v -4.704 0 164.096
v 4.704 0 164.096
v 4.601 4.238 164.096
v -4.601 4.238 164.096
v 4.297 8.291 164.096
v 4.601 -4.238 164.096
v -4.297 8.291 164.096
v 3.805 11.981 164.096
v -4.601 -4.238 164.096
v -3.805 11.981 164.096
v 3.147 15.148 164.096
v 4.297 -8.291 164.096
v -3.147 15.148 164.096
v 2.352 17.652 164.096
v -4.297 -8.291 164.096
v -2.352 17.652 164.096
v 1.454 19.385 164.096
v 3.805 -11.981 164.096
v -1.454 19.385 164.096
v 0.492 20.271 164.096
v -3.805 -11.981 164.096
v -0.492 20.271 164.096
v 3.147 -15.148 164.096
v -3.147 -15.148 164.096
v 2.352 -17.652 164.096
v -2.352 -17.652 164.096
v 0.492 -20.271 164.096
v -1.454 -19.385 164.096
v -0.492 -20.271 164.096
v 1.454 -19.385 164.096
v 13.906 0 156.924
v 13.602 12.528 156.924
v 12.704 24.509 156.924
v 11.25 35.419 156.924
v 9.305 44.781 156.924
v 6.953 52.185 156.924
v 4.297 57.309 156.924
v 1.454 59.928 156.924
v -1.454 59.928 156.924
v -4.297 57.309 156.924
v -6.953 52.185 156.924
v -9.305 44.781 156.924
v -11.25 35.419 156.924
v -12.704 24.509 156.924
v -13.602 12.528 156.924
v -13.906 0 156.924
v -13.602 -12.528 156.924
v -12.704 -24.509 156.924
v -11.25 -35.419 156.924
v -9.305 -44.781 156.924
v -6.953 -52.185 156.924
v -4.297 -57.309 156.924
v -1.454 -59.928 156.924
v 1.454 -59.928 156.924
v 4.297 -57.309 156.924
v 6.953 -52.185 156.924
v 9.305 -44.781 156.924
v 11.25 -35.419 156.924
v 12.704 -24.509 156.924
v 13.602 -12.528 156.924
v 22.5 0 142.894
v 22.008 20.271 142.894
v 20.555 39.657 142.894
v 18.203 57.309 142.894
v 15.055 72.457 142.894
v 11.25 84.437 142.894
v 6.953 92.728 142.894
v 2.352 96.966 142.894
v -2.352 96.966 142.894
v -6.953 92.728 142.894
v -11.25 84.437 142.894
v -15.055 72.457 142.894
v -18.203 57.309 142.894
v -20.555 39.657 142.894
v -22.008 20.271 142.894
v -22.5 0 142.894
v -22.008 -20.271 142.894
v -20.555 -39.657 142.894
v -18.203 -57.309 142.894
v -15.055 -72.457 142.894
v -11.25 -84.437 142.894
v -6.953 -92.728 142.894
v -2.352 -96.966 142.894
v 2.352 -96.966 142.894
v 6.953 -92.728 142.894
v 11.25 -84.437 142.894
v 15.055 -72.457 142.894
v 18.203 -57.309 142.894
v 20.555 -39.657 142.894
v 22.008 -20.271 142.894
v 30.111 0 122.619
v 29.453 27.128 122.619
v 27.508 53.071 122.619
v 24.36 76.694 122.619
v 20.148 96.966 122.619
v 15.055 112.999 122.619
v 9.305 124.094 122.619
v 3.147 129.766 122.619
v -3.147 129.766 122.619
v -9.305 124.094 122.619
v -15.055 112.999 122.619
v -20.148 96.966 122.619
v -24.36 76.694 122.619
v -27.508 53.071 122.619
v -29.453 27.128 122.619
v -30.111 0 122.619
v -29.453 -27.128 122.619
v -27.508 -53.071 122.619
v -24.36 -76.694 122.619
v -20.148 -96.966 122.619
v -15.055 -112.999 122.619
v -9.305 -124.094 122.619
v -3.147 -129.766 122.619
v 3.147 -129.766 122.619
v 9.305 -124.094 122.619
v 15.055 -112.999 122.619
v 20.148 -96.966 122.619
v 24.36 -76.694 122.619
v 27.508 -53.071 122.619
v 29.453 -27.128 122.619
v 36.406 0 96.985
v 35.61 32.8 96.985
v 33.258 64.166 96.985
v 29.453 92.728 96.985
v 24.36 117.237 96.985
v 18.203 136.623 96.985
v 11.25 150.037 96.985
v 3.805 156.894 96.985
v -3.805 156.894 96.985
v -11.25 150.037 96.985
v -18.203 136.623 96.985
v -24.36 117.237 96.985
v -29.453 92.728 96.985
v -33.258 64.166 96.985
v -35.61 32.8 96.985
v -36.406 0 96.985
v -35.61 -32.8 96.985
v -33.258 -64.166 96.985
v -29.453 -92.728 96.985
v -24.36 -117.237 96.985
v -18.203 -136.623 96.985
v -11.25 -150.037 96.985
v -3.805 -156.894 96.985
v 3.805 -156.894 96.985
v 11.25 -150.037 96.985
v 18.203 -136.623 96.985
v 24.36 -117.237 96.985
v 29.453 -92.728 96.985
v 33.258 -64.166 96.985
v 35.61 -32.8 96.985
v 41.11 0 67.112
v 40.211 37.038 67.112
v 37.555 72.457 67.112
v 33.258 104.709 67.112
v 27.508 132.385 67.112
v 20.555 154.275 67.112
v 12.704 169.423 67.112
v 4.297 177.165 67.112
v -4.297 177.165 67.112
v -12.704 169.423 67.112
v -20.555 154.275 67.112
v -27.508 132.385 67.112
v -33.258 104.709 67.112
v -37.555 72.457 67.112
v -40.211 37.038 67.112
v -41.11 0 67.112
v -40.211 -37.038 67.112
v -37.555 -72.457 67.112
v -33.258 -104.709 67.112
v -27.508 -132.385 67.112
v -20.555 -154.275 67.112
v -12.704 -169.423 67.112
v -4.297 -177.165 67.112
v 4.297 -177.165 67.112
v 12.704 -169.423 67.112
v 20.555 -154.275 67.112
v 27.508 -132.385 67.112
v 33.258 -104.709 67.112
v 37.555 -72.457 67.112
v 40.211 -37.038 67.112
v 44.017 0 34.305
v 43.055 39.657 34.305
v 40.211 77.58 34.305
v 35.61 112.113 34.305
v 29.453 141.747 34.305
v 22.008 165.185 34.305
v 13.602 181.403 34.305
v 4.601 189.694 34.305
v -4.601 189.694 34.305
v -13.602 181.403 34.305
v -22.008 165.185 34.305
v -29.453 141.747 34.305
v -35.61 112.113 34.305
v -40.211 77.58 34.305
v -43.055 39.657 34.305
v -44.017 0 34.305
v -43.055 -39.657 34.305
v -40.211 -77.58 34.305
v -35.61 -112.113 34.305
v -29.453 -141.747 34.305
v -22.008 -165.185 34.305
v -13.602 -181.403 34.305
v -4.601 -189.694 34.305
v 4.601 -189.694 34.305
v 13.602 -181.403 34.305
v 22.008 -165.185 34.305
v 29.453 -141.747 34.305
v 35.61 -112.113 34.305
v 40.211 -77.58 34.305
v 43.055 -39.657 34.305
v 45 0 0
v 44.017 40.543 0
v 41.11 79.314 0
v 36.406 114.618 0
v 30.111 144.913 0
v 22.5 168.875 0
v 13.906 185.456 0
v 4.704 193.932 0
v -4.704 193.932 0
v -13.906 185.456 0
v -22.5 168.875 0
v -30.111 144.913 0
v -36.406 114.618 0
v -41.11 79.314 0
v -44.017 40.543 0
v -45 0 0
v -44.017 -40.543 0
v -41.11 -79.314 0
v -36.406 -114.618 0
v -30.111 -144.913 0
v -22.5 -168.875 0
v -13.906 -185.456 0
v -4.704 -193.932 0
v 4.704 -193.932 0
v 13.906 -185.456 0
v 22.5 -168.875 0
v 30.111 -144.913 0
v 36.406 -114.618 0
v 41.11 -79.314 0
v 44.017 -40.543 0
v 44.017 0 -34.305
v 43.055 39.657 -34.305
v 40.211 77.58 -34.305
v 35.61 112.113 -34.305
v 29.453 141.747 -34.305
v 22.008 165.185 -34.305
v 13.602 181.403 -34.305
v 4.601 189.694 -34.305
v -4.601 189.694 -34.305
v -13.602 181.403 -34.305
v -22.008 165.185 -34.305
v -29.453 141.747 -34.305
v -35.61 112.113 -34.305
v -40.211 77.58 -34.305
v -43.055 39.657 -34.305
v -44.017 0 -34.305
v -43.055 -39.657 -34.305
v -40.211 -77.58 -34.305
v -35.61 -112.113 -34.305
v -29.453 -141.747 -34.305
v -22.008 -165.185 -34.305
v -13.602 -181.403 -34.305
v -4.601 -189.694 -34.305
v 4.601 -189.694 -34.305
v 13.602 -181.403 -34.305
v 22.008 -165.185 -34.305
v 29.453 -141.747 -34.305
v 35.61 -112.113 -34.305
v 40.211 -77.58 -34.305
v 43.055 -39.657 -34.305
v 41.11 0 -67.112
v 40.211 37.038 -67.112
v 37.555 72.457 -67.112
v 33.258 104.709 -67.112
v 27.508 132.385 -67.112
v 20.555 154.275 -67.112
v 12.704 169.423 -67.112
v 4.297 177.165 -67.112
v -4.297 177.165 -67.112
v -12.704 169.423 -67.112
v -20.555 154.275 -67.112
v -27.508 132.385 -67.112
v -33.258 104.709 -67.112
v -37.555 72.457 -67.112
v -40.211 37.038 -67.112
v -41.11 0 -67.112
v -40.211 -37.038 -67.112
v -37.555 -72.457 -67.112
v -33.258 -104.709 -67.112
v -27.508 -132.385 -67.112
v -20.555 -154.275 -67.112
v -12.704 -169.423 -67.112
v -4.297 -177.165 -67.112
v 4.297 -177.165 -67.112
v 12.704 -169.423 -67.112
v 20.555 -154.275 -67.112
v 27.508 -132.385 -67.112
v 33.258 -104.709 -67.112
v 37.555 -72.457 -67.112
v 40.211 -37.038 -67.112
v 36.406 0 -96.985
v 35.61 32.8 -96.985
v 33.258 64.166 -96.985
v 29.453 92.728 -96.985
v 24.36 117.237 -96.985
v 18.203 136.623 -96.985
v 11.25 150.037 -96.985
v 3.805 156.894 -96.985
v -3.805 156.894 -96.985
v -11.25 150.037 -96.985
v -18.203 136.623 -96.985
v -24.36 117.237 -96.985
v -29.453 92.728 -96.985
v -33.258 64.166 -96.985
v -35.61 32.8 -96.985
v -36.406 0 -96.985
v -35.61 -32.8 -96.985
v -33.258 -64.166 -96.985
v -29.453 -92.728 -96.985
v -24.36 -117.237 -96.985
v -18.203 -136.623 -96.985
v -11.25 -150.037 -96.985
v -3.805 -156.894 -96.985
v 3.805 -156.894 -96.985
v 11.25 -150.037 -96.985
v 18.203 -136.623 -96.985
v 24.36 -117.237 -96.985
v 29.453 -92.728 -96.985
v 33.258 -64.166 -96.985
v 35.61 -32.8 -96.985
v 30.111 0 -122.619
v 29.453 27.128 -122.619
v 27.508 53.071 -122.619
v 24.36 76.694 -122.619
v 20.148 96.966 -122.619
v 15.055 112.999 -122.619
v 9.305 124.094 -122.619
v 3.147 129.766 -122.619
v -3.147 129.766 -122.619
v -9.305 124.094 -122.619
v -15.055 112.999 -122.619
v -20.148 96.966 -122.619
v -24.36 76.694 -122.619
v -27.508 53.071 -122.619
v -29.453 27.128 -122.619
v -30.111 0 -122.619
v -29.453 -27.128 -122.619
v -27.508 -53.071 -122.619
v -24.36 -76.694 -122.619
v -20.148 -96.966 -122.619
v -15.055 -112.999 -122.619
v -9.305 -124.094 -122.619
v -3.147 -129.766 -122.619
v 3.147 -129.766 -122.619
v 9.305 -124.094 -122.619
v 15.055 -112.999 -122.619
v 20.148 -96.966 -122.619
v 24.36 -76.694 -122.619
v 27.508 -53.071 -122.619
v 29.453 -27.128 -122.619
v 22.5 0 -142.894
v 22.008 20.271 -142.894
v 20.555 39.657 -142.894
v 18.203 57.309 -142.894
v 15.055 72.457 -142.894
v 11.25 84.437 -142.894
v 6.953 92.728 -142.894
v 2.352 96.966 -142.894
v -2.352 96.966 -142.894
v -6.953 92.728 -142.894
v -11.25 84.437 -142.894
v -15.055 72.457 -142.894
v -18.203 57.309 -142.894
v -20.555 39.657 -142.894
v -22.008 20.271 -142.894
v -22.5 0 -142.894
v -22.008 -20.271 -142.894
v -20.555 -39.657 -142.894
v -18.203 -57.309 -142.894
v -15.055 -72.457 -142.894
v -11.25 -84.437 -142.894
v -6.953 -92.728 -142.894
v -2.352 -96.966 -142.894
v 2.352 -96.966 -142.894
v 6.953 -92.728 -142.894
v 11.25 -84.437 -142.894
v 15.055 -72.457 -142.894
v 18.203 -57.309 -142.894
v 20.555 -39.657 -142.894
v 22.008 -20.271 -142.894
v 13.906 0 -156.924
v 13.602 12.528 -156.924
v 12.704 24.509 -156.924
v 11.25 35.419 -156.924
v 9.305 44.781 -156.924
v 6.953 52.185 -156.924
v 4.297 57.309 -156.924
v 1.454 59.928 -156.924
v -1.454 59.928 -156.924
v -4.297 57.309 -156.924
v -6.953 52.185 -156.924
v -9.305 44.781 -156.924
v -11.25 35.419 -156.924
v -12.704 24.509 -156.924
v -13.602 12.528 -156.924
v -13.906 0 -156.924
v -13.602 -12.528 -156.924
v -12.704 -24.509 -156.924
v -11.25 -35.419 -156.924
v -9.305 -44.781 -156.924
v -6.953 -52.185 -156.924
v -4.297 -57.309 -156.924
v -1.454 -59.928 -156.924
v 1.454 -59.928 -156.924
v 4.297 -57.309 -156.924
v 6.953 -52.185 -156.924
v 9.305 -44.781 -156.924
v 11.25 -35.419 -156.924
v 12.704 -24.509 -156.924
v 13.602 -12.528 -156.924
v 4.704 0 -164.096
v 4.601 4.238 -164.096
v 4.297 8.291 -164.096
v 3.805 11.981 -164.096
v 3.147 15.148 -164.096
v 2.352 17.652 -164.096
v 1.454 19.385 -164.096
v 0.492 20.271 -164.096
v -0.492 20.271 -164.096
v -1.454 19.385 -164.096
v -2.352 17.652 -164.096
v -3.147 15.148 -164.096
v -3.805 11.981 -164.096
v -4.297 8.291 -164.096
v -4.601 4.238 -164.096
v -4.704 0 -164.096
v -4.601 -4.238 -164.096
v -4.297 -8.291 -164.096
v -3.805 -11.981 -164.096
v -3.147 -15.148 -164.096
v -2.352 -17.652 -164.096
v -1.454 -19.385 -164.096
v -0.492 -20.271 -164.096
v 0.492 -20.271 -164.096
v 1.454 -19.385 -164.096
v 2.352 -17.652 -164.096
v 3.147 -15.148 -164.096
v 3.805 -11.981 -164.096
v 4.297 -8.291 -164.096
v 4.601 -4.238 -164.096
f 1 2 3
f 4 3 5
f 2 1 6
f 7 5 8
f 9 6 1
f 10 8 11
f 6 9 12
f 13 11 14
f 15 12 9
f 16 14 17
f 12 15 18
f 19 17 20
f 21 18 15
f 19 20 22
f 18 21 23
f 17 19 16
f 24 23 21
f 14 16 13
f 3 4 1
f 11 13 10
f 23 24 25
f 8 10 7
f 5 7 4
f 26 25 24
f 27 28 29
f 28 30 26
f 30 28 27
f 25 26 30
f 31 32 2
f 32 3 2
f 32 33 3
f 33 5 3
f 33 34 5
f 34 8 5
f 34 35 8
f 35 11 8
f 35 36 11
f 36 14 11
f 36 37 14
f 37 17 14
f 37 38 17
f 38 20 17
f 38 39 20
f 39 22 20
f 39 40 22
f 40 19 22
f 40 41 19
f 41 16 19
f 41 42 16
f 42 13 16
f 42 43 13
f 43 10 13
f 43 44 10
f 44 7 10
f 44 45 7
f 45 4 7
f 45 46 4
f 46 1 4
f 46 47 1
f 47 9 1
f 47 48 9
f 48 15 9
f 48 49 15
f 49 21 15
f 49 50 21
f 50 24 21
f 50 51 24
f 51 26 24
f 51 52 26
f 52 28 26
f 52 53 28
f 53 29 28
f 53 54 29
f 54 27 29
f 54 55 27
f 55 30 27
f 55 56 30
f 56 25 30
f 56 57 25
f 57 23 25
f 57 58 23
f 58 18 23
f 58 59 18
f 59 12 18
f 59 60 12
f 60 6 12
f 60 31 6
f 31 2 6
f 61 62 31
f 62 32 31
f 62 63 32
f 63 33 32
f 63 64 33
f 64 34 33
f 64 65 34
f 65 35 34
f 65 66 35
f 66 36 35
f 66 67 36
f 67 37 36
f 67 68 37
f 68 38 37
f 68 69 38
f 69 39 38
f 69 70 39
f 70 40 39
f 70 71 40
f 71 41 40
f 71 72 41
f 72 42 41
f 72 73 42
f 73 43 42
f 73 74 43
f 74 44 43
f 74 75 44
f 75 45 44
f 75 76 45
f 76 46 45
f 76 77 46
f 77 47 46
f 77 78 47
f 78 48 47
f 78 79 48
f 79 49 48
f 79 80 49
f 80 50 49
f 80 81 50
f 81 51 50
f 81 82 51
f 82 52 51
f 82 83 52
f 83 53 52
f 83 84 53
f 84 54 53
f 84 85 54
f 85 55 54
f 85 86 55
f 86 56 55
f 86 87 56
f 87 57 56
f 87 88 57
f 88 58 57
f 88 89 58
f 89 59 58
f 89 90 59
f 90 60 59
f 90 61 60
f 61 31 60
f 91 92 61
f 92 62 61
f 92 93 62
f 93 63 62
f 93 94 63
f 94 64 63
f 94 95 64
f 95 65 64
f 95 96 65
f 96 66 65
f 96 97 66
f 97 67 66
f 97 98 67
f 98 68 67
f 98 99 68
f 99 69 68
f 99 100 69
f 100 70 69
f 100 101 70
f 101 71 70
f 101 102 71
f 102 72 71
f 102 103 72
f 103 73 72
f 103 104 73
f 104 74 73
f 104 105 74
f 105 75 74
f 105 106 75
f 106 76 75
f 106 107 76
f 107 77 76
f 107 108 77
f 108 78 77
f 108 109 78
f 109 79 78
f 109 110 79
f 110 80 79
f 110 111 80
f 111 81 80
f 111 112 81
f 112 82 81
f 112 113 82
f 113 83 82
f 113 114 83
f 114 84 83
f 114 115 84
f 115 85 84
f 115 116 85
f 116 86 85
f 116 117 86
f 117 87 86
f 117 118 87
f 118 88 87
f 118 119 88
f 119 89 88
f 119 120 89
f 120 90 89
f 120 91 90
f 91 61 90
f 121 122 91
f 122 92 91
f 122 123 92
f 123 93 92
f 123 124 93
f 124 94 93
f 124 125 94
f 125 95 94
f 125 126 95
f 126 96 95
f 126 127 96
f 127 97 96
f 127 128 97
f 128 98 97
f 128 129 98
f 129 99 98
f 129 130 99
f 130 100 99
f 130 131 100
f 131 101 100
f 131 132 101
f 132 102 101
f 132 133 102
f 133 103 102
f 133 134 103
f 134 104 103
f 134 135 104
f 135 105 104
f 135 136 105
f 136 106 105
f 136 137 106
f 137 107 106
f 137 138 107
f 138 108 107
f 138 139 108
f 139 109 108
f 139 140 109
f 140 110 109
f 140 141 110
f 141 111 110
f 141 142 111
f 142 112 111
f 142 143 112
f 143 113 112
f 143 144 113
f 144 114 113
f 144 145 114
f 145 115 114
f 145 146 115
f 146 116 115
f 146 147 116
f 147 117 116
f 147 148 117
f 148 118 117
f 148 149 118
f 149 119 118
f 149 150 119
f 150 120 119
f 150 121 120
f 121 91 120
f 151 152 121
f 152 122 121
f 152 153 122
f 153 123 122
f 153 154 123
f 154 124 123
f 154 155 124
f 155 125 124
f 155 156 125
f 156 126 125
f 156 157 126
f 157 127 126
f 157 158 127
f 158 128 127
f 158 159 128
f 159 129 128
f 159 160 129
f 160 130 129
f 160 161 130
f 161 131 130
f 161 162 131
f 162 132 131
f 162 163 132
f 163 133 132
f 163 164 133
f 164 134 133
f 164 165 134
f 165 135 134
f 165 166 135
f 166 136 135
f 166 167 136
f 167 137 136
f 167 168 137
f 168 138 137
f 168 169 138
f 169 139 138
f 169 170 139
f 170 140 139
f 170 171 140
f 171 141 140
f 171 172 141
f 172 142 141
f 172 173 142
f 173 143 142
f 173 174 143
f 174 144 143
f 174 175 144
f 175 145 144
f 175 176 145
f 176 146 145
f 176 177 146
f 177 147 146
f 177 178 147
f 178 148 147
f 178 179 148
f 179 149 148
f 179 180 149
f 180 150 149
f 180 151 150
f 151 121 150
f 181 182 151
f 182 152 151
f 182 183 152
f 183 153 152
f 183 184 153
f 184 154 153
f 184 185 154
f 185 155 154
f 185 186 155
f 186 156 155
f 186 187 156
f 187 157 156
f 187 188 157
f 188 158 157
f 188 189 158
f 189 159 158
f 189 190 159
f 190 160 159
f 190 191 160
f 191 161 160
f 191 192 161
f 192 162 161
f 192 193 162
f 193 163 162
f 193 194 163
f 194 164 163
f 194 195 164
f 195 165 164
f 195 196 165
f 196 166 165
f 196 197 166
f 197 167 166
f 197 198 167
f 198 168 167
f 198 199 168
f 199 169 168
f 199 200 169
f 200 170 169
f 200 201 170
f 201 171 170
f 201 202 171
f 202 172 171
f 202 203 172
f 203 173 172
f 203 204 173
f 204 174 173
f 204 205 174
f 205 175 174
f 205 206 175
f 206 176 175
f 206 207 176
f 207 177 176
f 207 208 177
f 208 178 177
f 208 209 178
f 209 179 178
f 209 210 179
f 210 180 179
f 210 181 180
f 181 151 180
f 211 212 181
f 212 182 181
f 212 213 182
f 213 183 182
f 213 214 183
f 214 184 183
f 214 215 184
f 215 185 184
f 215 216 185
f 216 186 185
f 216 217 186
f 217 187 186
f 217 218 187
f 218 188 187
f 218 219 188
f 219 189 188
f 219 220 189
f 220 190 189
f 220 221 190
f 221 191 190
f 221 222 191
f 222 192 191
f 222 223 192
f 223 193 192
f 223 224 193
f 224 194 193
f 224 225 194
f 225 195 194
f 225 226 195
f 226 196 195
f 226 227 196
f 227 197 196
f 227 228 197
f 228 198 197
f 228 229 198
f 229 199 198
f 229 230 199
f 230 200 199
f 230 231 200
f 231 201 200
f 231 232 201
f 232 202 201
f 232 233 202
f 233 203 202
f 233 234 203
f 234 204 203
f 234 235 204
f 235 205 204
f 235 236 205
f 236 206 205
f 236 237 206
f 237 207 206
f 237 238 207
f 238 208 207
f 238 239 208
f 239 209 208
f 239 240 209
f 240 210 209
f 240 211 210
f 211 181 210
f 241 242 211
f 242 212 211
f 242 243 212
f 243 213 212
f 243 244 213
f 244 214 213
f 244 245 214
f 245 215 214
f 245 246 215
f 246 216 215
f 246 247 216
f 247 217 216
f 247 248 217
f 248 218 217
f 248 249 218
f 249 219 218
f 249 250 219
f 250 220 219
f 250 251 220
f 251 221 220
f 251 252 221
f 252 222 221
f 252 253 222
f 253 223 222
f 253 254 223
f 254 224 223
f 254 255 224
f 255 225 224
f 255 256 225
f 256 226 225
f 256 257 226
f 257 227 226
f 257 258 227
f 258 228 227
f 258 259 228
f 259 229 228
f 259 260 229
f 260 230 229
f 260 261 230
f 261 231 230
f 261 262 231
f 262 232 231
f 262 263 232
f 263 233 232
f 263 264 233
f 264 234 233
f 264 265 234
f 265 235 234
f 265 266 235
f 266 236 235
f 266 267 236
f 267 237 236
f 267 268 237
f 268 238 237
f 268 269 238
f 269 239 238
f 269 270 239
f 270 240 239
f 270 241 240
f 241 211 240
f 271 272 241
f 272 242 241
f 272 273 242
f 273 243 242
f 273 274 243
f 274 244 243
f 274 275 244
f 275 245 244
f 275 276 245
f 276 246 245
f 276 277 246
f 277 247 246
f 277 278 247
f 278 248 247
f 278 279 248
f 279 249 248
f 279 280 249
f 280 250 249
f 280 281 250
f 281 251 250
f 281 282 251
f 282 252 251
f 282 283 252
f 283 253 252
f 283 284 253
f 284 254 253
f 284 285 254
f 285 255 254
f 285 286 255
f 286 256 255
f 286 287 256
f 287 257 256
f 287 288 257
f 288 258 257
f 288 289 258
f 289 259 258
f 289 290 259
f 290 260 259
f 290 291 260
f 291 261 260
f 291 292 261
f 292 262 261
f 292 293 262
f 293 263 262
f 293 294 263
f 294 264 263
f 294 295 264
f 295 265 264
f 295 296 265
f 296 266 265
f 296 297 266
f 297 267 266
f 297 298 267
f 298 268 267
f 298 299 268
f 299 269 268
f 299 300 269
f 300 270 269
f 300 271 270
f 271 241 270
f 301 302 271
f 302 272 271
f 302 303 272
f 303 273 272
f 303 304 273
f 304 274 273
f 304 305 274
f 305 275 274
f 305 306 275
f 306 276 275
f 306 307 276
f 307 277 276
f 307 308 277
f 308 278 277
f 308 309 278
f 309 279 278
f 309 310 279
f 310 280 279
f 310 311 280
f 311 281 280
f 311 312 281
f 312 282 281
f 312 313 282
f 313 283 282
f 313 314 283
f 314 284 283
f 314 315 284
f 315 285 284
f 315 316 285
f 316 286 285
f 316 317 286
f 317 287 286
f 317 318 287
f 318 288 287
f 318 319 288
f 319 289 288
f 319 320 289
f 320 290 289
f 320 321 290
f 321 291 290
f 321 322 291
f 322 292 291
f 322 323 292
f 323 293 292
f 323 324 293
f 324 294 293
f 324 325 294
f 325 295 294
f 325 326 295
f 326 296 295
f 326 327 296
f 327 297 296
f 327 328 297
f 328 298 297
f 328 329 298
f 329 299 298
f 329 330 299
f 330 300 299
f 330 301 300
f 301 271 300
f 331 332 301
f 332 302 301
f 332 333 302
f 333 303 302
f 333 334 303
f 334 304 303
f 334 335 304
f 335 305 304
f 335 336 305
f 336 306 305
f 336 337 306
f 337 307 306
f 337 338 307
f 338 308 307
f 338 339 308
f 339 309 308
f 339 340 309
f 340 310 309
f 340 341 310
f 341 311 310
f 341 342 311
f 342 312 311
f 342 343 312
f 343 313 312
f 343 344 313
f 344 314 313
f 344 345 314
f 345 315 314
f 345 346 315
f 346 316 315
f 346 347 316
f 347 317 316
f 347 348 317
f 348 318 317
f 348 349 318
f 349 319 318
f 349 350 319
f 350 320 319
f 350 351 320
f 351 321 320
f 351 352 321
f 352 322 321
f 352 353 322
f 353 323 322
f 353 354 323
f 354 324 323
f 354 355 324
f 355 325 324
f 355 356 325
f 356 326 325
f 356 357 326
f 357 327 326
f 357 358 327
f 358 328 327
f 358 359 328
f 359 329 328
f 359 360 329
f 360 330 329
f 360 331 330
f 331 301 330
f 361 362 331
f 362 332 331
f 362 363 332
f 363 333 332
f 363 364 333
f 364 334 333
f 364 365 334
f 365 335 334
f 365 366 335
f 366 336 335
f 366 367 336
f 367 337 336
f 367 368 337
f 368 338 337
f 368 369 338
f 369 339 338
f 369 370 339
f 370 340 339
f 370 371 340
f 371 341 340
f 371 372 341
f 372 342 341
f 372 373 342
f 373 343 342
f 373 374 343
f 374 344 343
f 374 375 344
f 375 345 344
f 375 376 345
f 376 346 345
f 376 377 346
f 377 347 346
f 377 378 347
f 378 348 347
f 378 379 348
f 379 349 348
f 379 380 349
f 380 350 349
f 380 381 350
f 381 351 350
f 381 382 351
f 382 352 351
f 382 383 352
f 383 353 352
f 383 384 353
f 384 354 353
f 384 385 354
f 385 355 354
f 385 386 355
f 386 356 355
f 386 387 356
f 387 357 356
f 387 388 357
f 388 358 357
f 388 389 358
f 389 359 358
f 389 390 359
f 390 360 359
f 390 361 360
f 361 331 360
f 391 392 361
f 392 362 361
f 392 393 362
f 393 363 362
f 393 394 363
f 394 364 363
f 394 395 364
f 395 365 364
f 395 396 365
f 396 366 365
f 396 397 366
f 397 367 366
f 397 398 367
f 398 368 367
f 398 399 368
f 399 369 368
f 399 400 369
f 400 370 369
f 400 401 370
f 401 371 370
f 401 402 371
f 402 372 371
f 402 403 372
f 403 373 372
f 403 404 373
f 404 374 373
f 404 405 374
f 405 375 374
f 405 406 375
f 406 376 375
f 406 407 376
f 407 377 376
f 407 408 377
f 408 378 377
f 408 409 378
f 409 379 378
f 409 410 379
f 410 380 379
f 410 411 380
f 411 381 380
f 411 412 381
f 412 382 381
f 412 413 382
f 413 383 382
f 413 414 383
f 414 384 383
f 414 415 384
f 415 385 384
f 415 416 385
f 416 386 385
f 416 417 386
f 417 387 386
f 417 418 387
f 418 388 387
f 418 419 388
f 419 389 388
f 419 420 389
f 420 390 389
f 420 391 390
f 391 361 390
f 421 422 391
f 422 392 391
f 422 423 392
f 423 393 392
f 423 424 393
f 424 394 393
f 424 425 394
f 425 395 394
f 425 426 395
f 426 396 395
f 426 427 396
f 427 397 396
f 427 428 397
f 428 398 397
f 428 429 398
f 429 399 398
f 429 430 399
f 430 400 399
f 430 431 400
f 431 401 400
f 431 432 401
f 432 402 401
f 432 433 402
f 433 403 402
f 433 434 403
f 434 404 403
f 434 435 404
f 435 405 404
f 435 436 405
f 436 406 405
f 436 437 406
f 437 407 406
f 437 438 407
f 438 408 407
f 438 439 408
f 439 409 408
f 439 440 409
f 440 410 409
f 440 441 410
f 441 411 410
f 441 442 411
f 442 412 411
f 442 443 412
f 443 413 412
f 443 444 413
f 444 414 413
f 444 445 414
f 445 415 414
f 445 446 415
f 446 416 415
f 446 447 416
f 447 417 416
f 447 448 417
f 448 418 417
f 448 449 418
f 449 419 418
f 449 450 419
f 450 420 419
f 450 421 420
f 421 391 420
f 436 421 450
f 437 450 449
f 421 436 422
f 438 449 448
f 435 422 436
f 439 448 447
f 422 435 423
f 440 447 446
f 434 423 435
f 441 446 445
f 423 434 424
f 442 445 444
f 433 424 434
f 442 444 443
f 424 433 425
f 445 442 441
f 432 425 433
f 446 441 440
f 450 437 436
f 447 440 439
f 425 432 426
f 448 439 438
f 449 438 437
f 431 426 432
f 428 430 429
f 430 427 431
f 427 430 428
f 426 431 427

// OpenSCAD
// Generated by SolidPython 1.0.1 on 2020-07-29 00:46:45


scale(v = [3, 13, 11]) {
	sphere(r = 15);
}
/***********************************************
*********      SolidPython code:      **********
************************************************
 
# import packages: SolidPython
from solid import *
from solid.utils import *
from itertools import chain, combinations, permutations


class Resize:

    def __init__(self, scad_file):
        self.scad_file = scad_file
        #self.scad_file = import_scad(scad_file)
        # cone/cylinder param:
        self.r1 = 0
        self.r2 = 0
        self.h = 0
        # rectangular prism param:
        self.w = 0
        self.l = 0
        # ellipse param:
        self.r = 0

    # import OpenScad code (file name corresponds to shape)


    # classify shape + parameters
    def assign(self, param1, param2, param3):
        if self.scad_file == 'cone.scad':
            self.r1 = param1
            self.r2 = param2
            self.h = param3
        elif self.scad_file == 'cylinder.scad':
            self.r1 = param1
            self.r2 = param2
            self.h = param3
        elif self.scad_file == 'rectangularPrism.scad':
            self.h = param1
            self.l = param2
            self.w = param3
        else:
            self.r = param1
            self.h = param2

    # resize parameters
    def iterate(self):
        x = range(3, 20, 2)
        i = 1
        if self.scad_file == 'cone.scad':
            tempList = list(permutations(x, 2))
            for temp in tempList:
                param1 = temp[0]
                param2 = temp[1]
                filepath = 'produced_scad_files/' + 'cone' + str(param1) + '_' + str(param2) + '_' + '.scad'
                scad_render_to_file(cylinder(h=param1, r1=param2, r2=0), filepath)

        elif self.scad_file == 'cylinder.scad':
            tempList = list(permutations(x, 3))
            for temp in tempList:
                param1 = temp[0]
                param2 = temp[1]
                filepath = 'produced_scad_files/' + 'cylinder' + str(param1) + '_' + str(param2) + '_' + '.scad'
                scad_render_to_file(cylinder(h=param1, r1=param2, r2=param2), filepath)

        elif self.scad_file == 'rectangularPrism.scad':
            tempList = list(permutations(x, 3))
            for temp in tempList:
                param1 = temp[0]
                param2 = temp[1]
                param3 = temp[2]
                filepath = 'produced_scad_files/' + 'rectangularPrism' + str(param1) + '_' + str(param2) + '_' + str(
                    param3) + '.scad'
                scad_render_to_file(cube(size=(param1, param2, param3)), filepath)

        elif self.scad_file == 'ellipse.scad':
            tempList = list(permutations(x, 4))
            for temp in tempList:
                param1 = temp[0]
                param2 = temp[1]
                param3 = temp[2]
                param4 = temp[3]
                filepath = 'produced_scad_files/' + 'ellipse' + str(param1) + '_' + str(param2) + '_' + str(param3) + '_' + str(param4) + '.scad'
                scad_render_to_file(scale([param1, param2, param3])(sphere(r=param4)), filepath)

    def render_to_scadfile(self):
        scad_render_to_file(scad, 'example.scad') 
 
************************************************/
